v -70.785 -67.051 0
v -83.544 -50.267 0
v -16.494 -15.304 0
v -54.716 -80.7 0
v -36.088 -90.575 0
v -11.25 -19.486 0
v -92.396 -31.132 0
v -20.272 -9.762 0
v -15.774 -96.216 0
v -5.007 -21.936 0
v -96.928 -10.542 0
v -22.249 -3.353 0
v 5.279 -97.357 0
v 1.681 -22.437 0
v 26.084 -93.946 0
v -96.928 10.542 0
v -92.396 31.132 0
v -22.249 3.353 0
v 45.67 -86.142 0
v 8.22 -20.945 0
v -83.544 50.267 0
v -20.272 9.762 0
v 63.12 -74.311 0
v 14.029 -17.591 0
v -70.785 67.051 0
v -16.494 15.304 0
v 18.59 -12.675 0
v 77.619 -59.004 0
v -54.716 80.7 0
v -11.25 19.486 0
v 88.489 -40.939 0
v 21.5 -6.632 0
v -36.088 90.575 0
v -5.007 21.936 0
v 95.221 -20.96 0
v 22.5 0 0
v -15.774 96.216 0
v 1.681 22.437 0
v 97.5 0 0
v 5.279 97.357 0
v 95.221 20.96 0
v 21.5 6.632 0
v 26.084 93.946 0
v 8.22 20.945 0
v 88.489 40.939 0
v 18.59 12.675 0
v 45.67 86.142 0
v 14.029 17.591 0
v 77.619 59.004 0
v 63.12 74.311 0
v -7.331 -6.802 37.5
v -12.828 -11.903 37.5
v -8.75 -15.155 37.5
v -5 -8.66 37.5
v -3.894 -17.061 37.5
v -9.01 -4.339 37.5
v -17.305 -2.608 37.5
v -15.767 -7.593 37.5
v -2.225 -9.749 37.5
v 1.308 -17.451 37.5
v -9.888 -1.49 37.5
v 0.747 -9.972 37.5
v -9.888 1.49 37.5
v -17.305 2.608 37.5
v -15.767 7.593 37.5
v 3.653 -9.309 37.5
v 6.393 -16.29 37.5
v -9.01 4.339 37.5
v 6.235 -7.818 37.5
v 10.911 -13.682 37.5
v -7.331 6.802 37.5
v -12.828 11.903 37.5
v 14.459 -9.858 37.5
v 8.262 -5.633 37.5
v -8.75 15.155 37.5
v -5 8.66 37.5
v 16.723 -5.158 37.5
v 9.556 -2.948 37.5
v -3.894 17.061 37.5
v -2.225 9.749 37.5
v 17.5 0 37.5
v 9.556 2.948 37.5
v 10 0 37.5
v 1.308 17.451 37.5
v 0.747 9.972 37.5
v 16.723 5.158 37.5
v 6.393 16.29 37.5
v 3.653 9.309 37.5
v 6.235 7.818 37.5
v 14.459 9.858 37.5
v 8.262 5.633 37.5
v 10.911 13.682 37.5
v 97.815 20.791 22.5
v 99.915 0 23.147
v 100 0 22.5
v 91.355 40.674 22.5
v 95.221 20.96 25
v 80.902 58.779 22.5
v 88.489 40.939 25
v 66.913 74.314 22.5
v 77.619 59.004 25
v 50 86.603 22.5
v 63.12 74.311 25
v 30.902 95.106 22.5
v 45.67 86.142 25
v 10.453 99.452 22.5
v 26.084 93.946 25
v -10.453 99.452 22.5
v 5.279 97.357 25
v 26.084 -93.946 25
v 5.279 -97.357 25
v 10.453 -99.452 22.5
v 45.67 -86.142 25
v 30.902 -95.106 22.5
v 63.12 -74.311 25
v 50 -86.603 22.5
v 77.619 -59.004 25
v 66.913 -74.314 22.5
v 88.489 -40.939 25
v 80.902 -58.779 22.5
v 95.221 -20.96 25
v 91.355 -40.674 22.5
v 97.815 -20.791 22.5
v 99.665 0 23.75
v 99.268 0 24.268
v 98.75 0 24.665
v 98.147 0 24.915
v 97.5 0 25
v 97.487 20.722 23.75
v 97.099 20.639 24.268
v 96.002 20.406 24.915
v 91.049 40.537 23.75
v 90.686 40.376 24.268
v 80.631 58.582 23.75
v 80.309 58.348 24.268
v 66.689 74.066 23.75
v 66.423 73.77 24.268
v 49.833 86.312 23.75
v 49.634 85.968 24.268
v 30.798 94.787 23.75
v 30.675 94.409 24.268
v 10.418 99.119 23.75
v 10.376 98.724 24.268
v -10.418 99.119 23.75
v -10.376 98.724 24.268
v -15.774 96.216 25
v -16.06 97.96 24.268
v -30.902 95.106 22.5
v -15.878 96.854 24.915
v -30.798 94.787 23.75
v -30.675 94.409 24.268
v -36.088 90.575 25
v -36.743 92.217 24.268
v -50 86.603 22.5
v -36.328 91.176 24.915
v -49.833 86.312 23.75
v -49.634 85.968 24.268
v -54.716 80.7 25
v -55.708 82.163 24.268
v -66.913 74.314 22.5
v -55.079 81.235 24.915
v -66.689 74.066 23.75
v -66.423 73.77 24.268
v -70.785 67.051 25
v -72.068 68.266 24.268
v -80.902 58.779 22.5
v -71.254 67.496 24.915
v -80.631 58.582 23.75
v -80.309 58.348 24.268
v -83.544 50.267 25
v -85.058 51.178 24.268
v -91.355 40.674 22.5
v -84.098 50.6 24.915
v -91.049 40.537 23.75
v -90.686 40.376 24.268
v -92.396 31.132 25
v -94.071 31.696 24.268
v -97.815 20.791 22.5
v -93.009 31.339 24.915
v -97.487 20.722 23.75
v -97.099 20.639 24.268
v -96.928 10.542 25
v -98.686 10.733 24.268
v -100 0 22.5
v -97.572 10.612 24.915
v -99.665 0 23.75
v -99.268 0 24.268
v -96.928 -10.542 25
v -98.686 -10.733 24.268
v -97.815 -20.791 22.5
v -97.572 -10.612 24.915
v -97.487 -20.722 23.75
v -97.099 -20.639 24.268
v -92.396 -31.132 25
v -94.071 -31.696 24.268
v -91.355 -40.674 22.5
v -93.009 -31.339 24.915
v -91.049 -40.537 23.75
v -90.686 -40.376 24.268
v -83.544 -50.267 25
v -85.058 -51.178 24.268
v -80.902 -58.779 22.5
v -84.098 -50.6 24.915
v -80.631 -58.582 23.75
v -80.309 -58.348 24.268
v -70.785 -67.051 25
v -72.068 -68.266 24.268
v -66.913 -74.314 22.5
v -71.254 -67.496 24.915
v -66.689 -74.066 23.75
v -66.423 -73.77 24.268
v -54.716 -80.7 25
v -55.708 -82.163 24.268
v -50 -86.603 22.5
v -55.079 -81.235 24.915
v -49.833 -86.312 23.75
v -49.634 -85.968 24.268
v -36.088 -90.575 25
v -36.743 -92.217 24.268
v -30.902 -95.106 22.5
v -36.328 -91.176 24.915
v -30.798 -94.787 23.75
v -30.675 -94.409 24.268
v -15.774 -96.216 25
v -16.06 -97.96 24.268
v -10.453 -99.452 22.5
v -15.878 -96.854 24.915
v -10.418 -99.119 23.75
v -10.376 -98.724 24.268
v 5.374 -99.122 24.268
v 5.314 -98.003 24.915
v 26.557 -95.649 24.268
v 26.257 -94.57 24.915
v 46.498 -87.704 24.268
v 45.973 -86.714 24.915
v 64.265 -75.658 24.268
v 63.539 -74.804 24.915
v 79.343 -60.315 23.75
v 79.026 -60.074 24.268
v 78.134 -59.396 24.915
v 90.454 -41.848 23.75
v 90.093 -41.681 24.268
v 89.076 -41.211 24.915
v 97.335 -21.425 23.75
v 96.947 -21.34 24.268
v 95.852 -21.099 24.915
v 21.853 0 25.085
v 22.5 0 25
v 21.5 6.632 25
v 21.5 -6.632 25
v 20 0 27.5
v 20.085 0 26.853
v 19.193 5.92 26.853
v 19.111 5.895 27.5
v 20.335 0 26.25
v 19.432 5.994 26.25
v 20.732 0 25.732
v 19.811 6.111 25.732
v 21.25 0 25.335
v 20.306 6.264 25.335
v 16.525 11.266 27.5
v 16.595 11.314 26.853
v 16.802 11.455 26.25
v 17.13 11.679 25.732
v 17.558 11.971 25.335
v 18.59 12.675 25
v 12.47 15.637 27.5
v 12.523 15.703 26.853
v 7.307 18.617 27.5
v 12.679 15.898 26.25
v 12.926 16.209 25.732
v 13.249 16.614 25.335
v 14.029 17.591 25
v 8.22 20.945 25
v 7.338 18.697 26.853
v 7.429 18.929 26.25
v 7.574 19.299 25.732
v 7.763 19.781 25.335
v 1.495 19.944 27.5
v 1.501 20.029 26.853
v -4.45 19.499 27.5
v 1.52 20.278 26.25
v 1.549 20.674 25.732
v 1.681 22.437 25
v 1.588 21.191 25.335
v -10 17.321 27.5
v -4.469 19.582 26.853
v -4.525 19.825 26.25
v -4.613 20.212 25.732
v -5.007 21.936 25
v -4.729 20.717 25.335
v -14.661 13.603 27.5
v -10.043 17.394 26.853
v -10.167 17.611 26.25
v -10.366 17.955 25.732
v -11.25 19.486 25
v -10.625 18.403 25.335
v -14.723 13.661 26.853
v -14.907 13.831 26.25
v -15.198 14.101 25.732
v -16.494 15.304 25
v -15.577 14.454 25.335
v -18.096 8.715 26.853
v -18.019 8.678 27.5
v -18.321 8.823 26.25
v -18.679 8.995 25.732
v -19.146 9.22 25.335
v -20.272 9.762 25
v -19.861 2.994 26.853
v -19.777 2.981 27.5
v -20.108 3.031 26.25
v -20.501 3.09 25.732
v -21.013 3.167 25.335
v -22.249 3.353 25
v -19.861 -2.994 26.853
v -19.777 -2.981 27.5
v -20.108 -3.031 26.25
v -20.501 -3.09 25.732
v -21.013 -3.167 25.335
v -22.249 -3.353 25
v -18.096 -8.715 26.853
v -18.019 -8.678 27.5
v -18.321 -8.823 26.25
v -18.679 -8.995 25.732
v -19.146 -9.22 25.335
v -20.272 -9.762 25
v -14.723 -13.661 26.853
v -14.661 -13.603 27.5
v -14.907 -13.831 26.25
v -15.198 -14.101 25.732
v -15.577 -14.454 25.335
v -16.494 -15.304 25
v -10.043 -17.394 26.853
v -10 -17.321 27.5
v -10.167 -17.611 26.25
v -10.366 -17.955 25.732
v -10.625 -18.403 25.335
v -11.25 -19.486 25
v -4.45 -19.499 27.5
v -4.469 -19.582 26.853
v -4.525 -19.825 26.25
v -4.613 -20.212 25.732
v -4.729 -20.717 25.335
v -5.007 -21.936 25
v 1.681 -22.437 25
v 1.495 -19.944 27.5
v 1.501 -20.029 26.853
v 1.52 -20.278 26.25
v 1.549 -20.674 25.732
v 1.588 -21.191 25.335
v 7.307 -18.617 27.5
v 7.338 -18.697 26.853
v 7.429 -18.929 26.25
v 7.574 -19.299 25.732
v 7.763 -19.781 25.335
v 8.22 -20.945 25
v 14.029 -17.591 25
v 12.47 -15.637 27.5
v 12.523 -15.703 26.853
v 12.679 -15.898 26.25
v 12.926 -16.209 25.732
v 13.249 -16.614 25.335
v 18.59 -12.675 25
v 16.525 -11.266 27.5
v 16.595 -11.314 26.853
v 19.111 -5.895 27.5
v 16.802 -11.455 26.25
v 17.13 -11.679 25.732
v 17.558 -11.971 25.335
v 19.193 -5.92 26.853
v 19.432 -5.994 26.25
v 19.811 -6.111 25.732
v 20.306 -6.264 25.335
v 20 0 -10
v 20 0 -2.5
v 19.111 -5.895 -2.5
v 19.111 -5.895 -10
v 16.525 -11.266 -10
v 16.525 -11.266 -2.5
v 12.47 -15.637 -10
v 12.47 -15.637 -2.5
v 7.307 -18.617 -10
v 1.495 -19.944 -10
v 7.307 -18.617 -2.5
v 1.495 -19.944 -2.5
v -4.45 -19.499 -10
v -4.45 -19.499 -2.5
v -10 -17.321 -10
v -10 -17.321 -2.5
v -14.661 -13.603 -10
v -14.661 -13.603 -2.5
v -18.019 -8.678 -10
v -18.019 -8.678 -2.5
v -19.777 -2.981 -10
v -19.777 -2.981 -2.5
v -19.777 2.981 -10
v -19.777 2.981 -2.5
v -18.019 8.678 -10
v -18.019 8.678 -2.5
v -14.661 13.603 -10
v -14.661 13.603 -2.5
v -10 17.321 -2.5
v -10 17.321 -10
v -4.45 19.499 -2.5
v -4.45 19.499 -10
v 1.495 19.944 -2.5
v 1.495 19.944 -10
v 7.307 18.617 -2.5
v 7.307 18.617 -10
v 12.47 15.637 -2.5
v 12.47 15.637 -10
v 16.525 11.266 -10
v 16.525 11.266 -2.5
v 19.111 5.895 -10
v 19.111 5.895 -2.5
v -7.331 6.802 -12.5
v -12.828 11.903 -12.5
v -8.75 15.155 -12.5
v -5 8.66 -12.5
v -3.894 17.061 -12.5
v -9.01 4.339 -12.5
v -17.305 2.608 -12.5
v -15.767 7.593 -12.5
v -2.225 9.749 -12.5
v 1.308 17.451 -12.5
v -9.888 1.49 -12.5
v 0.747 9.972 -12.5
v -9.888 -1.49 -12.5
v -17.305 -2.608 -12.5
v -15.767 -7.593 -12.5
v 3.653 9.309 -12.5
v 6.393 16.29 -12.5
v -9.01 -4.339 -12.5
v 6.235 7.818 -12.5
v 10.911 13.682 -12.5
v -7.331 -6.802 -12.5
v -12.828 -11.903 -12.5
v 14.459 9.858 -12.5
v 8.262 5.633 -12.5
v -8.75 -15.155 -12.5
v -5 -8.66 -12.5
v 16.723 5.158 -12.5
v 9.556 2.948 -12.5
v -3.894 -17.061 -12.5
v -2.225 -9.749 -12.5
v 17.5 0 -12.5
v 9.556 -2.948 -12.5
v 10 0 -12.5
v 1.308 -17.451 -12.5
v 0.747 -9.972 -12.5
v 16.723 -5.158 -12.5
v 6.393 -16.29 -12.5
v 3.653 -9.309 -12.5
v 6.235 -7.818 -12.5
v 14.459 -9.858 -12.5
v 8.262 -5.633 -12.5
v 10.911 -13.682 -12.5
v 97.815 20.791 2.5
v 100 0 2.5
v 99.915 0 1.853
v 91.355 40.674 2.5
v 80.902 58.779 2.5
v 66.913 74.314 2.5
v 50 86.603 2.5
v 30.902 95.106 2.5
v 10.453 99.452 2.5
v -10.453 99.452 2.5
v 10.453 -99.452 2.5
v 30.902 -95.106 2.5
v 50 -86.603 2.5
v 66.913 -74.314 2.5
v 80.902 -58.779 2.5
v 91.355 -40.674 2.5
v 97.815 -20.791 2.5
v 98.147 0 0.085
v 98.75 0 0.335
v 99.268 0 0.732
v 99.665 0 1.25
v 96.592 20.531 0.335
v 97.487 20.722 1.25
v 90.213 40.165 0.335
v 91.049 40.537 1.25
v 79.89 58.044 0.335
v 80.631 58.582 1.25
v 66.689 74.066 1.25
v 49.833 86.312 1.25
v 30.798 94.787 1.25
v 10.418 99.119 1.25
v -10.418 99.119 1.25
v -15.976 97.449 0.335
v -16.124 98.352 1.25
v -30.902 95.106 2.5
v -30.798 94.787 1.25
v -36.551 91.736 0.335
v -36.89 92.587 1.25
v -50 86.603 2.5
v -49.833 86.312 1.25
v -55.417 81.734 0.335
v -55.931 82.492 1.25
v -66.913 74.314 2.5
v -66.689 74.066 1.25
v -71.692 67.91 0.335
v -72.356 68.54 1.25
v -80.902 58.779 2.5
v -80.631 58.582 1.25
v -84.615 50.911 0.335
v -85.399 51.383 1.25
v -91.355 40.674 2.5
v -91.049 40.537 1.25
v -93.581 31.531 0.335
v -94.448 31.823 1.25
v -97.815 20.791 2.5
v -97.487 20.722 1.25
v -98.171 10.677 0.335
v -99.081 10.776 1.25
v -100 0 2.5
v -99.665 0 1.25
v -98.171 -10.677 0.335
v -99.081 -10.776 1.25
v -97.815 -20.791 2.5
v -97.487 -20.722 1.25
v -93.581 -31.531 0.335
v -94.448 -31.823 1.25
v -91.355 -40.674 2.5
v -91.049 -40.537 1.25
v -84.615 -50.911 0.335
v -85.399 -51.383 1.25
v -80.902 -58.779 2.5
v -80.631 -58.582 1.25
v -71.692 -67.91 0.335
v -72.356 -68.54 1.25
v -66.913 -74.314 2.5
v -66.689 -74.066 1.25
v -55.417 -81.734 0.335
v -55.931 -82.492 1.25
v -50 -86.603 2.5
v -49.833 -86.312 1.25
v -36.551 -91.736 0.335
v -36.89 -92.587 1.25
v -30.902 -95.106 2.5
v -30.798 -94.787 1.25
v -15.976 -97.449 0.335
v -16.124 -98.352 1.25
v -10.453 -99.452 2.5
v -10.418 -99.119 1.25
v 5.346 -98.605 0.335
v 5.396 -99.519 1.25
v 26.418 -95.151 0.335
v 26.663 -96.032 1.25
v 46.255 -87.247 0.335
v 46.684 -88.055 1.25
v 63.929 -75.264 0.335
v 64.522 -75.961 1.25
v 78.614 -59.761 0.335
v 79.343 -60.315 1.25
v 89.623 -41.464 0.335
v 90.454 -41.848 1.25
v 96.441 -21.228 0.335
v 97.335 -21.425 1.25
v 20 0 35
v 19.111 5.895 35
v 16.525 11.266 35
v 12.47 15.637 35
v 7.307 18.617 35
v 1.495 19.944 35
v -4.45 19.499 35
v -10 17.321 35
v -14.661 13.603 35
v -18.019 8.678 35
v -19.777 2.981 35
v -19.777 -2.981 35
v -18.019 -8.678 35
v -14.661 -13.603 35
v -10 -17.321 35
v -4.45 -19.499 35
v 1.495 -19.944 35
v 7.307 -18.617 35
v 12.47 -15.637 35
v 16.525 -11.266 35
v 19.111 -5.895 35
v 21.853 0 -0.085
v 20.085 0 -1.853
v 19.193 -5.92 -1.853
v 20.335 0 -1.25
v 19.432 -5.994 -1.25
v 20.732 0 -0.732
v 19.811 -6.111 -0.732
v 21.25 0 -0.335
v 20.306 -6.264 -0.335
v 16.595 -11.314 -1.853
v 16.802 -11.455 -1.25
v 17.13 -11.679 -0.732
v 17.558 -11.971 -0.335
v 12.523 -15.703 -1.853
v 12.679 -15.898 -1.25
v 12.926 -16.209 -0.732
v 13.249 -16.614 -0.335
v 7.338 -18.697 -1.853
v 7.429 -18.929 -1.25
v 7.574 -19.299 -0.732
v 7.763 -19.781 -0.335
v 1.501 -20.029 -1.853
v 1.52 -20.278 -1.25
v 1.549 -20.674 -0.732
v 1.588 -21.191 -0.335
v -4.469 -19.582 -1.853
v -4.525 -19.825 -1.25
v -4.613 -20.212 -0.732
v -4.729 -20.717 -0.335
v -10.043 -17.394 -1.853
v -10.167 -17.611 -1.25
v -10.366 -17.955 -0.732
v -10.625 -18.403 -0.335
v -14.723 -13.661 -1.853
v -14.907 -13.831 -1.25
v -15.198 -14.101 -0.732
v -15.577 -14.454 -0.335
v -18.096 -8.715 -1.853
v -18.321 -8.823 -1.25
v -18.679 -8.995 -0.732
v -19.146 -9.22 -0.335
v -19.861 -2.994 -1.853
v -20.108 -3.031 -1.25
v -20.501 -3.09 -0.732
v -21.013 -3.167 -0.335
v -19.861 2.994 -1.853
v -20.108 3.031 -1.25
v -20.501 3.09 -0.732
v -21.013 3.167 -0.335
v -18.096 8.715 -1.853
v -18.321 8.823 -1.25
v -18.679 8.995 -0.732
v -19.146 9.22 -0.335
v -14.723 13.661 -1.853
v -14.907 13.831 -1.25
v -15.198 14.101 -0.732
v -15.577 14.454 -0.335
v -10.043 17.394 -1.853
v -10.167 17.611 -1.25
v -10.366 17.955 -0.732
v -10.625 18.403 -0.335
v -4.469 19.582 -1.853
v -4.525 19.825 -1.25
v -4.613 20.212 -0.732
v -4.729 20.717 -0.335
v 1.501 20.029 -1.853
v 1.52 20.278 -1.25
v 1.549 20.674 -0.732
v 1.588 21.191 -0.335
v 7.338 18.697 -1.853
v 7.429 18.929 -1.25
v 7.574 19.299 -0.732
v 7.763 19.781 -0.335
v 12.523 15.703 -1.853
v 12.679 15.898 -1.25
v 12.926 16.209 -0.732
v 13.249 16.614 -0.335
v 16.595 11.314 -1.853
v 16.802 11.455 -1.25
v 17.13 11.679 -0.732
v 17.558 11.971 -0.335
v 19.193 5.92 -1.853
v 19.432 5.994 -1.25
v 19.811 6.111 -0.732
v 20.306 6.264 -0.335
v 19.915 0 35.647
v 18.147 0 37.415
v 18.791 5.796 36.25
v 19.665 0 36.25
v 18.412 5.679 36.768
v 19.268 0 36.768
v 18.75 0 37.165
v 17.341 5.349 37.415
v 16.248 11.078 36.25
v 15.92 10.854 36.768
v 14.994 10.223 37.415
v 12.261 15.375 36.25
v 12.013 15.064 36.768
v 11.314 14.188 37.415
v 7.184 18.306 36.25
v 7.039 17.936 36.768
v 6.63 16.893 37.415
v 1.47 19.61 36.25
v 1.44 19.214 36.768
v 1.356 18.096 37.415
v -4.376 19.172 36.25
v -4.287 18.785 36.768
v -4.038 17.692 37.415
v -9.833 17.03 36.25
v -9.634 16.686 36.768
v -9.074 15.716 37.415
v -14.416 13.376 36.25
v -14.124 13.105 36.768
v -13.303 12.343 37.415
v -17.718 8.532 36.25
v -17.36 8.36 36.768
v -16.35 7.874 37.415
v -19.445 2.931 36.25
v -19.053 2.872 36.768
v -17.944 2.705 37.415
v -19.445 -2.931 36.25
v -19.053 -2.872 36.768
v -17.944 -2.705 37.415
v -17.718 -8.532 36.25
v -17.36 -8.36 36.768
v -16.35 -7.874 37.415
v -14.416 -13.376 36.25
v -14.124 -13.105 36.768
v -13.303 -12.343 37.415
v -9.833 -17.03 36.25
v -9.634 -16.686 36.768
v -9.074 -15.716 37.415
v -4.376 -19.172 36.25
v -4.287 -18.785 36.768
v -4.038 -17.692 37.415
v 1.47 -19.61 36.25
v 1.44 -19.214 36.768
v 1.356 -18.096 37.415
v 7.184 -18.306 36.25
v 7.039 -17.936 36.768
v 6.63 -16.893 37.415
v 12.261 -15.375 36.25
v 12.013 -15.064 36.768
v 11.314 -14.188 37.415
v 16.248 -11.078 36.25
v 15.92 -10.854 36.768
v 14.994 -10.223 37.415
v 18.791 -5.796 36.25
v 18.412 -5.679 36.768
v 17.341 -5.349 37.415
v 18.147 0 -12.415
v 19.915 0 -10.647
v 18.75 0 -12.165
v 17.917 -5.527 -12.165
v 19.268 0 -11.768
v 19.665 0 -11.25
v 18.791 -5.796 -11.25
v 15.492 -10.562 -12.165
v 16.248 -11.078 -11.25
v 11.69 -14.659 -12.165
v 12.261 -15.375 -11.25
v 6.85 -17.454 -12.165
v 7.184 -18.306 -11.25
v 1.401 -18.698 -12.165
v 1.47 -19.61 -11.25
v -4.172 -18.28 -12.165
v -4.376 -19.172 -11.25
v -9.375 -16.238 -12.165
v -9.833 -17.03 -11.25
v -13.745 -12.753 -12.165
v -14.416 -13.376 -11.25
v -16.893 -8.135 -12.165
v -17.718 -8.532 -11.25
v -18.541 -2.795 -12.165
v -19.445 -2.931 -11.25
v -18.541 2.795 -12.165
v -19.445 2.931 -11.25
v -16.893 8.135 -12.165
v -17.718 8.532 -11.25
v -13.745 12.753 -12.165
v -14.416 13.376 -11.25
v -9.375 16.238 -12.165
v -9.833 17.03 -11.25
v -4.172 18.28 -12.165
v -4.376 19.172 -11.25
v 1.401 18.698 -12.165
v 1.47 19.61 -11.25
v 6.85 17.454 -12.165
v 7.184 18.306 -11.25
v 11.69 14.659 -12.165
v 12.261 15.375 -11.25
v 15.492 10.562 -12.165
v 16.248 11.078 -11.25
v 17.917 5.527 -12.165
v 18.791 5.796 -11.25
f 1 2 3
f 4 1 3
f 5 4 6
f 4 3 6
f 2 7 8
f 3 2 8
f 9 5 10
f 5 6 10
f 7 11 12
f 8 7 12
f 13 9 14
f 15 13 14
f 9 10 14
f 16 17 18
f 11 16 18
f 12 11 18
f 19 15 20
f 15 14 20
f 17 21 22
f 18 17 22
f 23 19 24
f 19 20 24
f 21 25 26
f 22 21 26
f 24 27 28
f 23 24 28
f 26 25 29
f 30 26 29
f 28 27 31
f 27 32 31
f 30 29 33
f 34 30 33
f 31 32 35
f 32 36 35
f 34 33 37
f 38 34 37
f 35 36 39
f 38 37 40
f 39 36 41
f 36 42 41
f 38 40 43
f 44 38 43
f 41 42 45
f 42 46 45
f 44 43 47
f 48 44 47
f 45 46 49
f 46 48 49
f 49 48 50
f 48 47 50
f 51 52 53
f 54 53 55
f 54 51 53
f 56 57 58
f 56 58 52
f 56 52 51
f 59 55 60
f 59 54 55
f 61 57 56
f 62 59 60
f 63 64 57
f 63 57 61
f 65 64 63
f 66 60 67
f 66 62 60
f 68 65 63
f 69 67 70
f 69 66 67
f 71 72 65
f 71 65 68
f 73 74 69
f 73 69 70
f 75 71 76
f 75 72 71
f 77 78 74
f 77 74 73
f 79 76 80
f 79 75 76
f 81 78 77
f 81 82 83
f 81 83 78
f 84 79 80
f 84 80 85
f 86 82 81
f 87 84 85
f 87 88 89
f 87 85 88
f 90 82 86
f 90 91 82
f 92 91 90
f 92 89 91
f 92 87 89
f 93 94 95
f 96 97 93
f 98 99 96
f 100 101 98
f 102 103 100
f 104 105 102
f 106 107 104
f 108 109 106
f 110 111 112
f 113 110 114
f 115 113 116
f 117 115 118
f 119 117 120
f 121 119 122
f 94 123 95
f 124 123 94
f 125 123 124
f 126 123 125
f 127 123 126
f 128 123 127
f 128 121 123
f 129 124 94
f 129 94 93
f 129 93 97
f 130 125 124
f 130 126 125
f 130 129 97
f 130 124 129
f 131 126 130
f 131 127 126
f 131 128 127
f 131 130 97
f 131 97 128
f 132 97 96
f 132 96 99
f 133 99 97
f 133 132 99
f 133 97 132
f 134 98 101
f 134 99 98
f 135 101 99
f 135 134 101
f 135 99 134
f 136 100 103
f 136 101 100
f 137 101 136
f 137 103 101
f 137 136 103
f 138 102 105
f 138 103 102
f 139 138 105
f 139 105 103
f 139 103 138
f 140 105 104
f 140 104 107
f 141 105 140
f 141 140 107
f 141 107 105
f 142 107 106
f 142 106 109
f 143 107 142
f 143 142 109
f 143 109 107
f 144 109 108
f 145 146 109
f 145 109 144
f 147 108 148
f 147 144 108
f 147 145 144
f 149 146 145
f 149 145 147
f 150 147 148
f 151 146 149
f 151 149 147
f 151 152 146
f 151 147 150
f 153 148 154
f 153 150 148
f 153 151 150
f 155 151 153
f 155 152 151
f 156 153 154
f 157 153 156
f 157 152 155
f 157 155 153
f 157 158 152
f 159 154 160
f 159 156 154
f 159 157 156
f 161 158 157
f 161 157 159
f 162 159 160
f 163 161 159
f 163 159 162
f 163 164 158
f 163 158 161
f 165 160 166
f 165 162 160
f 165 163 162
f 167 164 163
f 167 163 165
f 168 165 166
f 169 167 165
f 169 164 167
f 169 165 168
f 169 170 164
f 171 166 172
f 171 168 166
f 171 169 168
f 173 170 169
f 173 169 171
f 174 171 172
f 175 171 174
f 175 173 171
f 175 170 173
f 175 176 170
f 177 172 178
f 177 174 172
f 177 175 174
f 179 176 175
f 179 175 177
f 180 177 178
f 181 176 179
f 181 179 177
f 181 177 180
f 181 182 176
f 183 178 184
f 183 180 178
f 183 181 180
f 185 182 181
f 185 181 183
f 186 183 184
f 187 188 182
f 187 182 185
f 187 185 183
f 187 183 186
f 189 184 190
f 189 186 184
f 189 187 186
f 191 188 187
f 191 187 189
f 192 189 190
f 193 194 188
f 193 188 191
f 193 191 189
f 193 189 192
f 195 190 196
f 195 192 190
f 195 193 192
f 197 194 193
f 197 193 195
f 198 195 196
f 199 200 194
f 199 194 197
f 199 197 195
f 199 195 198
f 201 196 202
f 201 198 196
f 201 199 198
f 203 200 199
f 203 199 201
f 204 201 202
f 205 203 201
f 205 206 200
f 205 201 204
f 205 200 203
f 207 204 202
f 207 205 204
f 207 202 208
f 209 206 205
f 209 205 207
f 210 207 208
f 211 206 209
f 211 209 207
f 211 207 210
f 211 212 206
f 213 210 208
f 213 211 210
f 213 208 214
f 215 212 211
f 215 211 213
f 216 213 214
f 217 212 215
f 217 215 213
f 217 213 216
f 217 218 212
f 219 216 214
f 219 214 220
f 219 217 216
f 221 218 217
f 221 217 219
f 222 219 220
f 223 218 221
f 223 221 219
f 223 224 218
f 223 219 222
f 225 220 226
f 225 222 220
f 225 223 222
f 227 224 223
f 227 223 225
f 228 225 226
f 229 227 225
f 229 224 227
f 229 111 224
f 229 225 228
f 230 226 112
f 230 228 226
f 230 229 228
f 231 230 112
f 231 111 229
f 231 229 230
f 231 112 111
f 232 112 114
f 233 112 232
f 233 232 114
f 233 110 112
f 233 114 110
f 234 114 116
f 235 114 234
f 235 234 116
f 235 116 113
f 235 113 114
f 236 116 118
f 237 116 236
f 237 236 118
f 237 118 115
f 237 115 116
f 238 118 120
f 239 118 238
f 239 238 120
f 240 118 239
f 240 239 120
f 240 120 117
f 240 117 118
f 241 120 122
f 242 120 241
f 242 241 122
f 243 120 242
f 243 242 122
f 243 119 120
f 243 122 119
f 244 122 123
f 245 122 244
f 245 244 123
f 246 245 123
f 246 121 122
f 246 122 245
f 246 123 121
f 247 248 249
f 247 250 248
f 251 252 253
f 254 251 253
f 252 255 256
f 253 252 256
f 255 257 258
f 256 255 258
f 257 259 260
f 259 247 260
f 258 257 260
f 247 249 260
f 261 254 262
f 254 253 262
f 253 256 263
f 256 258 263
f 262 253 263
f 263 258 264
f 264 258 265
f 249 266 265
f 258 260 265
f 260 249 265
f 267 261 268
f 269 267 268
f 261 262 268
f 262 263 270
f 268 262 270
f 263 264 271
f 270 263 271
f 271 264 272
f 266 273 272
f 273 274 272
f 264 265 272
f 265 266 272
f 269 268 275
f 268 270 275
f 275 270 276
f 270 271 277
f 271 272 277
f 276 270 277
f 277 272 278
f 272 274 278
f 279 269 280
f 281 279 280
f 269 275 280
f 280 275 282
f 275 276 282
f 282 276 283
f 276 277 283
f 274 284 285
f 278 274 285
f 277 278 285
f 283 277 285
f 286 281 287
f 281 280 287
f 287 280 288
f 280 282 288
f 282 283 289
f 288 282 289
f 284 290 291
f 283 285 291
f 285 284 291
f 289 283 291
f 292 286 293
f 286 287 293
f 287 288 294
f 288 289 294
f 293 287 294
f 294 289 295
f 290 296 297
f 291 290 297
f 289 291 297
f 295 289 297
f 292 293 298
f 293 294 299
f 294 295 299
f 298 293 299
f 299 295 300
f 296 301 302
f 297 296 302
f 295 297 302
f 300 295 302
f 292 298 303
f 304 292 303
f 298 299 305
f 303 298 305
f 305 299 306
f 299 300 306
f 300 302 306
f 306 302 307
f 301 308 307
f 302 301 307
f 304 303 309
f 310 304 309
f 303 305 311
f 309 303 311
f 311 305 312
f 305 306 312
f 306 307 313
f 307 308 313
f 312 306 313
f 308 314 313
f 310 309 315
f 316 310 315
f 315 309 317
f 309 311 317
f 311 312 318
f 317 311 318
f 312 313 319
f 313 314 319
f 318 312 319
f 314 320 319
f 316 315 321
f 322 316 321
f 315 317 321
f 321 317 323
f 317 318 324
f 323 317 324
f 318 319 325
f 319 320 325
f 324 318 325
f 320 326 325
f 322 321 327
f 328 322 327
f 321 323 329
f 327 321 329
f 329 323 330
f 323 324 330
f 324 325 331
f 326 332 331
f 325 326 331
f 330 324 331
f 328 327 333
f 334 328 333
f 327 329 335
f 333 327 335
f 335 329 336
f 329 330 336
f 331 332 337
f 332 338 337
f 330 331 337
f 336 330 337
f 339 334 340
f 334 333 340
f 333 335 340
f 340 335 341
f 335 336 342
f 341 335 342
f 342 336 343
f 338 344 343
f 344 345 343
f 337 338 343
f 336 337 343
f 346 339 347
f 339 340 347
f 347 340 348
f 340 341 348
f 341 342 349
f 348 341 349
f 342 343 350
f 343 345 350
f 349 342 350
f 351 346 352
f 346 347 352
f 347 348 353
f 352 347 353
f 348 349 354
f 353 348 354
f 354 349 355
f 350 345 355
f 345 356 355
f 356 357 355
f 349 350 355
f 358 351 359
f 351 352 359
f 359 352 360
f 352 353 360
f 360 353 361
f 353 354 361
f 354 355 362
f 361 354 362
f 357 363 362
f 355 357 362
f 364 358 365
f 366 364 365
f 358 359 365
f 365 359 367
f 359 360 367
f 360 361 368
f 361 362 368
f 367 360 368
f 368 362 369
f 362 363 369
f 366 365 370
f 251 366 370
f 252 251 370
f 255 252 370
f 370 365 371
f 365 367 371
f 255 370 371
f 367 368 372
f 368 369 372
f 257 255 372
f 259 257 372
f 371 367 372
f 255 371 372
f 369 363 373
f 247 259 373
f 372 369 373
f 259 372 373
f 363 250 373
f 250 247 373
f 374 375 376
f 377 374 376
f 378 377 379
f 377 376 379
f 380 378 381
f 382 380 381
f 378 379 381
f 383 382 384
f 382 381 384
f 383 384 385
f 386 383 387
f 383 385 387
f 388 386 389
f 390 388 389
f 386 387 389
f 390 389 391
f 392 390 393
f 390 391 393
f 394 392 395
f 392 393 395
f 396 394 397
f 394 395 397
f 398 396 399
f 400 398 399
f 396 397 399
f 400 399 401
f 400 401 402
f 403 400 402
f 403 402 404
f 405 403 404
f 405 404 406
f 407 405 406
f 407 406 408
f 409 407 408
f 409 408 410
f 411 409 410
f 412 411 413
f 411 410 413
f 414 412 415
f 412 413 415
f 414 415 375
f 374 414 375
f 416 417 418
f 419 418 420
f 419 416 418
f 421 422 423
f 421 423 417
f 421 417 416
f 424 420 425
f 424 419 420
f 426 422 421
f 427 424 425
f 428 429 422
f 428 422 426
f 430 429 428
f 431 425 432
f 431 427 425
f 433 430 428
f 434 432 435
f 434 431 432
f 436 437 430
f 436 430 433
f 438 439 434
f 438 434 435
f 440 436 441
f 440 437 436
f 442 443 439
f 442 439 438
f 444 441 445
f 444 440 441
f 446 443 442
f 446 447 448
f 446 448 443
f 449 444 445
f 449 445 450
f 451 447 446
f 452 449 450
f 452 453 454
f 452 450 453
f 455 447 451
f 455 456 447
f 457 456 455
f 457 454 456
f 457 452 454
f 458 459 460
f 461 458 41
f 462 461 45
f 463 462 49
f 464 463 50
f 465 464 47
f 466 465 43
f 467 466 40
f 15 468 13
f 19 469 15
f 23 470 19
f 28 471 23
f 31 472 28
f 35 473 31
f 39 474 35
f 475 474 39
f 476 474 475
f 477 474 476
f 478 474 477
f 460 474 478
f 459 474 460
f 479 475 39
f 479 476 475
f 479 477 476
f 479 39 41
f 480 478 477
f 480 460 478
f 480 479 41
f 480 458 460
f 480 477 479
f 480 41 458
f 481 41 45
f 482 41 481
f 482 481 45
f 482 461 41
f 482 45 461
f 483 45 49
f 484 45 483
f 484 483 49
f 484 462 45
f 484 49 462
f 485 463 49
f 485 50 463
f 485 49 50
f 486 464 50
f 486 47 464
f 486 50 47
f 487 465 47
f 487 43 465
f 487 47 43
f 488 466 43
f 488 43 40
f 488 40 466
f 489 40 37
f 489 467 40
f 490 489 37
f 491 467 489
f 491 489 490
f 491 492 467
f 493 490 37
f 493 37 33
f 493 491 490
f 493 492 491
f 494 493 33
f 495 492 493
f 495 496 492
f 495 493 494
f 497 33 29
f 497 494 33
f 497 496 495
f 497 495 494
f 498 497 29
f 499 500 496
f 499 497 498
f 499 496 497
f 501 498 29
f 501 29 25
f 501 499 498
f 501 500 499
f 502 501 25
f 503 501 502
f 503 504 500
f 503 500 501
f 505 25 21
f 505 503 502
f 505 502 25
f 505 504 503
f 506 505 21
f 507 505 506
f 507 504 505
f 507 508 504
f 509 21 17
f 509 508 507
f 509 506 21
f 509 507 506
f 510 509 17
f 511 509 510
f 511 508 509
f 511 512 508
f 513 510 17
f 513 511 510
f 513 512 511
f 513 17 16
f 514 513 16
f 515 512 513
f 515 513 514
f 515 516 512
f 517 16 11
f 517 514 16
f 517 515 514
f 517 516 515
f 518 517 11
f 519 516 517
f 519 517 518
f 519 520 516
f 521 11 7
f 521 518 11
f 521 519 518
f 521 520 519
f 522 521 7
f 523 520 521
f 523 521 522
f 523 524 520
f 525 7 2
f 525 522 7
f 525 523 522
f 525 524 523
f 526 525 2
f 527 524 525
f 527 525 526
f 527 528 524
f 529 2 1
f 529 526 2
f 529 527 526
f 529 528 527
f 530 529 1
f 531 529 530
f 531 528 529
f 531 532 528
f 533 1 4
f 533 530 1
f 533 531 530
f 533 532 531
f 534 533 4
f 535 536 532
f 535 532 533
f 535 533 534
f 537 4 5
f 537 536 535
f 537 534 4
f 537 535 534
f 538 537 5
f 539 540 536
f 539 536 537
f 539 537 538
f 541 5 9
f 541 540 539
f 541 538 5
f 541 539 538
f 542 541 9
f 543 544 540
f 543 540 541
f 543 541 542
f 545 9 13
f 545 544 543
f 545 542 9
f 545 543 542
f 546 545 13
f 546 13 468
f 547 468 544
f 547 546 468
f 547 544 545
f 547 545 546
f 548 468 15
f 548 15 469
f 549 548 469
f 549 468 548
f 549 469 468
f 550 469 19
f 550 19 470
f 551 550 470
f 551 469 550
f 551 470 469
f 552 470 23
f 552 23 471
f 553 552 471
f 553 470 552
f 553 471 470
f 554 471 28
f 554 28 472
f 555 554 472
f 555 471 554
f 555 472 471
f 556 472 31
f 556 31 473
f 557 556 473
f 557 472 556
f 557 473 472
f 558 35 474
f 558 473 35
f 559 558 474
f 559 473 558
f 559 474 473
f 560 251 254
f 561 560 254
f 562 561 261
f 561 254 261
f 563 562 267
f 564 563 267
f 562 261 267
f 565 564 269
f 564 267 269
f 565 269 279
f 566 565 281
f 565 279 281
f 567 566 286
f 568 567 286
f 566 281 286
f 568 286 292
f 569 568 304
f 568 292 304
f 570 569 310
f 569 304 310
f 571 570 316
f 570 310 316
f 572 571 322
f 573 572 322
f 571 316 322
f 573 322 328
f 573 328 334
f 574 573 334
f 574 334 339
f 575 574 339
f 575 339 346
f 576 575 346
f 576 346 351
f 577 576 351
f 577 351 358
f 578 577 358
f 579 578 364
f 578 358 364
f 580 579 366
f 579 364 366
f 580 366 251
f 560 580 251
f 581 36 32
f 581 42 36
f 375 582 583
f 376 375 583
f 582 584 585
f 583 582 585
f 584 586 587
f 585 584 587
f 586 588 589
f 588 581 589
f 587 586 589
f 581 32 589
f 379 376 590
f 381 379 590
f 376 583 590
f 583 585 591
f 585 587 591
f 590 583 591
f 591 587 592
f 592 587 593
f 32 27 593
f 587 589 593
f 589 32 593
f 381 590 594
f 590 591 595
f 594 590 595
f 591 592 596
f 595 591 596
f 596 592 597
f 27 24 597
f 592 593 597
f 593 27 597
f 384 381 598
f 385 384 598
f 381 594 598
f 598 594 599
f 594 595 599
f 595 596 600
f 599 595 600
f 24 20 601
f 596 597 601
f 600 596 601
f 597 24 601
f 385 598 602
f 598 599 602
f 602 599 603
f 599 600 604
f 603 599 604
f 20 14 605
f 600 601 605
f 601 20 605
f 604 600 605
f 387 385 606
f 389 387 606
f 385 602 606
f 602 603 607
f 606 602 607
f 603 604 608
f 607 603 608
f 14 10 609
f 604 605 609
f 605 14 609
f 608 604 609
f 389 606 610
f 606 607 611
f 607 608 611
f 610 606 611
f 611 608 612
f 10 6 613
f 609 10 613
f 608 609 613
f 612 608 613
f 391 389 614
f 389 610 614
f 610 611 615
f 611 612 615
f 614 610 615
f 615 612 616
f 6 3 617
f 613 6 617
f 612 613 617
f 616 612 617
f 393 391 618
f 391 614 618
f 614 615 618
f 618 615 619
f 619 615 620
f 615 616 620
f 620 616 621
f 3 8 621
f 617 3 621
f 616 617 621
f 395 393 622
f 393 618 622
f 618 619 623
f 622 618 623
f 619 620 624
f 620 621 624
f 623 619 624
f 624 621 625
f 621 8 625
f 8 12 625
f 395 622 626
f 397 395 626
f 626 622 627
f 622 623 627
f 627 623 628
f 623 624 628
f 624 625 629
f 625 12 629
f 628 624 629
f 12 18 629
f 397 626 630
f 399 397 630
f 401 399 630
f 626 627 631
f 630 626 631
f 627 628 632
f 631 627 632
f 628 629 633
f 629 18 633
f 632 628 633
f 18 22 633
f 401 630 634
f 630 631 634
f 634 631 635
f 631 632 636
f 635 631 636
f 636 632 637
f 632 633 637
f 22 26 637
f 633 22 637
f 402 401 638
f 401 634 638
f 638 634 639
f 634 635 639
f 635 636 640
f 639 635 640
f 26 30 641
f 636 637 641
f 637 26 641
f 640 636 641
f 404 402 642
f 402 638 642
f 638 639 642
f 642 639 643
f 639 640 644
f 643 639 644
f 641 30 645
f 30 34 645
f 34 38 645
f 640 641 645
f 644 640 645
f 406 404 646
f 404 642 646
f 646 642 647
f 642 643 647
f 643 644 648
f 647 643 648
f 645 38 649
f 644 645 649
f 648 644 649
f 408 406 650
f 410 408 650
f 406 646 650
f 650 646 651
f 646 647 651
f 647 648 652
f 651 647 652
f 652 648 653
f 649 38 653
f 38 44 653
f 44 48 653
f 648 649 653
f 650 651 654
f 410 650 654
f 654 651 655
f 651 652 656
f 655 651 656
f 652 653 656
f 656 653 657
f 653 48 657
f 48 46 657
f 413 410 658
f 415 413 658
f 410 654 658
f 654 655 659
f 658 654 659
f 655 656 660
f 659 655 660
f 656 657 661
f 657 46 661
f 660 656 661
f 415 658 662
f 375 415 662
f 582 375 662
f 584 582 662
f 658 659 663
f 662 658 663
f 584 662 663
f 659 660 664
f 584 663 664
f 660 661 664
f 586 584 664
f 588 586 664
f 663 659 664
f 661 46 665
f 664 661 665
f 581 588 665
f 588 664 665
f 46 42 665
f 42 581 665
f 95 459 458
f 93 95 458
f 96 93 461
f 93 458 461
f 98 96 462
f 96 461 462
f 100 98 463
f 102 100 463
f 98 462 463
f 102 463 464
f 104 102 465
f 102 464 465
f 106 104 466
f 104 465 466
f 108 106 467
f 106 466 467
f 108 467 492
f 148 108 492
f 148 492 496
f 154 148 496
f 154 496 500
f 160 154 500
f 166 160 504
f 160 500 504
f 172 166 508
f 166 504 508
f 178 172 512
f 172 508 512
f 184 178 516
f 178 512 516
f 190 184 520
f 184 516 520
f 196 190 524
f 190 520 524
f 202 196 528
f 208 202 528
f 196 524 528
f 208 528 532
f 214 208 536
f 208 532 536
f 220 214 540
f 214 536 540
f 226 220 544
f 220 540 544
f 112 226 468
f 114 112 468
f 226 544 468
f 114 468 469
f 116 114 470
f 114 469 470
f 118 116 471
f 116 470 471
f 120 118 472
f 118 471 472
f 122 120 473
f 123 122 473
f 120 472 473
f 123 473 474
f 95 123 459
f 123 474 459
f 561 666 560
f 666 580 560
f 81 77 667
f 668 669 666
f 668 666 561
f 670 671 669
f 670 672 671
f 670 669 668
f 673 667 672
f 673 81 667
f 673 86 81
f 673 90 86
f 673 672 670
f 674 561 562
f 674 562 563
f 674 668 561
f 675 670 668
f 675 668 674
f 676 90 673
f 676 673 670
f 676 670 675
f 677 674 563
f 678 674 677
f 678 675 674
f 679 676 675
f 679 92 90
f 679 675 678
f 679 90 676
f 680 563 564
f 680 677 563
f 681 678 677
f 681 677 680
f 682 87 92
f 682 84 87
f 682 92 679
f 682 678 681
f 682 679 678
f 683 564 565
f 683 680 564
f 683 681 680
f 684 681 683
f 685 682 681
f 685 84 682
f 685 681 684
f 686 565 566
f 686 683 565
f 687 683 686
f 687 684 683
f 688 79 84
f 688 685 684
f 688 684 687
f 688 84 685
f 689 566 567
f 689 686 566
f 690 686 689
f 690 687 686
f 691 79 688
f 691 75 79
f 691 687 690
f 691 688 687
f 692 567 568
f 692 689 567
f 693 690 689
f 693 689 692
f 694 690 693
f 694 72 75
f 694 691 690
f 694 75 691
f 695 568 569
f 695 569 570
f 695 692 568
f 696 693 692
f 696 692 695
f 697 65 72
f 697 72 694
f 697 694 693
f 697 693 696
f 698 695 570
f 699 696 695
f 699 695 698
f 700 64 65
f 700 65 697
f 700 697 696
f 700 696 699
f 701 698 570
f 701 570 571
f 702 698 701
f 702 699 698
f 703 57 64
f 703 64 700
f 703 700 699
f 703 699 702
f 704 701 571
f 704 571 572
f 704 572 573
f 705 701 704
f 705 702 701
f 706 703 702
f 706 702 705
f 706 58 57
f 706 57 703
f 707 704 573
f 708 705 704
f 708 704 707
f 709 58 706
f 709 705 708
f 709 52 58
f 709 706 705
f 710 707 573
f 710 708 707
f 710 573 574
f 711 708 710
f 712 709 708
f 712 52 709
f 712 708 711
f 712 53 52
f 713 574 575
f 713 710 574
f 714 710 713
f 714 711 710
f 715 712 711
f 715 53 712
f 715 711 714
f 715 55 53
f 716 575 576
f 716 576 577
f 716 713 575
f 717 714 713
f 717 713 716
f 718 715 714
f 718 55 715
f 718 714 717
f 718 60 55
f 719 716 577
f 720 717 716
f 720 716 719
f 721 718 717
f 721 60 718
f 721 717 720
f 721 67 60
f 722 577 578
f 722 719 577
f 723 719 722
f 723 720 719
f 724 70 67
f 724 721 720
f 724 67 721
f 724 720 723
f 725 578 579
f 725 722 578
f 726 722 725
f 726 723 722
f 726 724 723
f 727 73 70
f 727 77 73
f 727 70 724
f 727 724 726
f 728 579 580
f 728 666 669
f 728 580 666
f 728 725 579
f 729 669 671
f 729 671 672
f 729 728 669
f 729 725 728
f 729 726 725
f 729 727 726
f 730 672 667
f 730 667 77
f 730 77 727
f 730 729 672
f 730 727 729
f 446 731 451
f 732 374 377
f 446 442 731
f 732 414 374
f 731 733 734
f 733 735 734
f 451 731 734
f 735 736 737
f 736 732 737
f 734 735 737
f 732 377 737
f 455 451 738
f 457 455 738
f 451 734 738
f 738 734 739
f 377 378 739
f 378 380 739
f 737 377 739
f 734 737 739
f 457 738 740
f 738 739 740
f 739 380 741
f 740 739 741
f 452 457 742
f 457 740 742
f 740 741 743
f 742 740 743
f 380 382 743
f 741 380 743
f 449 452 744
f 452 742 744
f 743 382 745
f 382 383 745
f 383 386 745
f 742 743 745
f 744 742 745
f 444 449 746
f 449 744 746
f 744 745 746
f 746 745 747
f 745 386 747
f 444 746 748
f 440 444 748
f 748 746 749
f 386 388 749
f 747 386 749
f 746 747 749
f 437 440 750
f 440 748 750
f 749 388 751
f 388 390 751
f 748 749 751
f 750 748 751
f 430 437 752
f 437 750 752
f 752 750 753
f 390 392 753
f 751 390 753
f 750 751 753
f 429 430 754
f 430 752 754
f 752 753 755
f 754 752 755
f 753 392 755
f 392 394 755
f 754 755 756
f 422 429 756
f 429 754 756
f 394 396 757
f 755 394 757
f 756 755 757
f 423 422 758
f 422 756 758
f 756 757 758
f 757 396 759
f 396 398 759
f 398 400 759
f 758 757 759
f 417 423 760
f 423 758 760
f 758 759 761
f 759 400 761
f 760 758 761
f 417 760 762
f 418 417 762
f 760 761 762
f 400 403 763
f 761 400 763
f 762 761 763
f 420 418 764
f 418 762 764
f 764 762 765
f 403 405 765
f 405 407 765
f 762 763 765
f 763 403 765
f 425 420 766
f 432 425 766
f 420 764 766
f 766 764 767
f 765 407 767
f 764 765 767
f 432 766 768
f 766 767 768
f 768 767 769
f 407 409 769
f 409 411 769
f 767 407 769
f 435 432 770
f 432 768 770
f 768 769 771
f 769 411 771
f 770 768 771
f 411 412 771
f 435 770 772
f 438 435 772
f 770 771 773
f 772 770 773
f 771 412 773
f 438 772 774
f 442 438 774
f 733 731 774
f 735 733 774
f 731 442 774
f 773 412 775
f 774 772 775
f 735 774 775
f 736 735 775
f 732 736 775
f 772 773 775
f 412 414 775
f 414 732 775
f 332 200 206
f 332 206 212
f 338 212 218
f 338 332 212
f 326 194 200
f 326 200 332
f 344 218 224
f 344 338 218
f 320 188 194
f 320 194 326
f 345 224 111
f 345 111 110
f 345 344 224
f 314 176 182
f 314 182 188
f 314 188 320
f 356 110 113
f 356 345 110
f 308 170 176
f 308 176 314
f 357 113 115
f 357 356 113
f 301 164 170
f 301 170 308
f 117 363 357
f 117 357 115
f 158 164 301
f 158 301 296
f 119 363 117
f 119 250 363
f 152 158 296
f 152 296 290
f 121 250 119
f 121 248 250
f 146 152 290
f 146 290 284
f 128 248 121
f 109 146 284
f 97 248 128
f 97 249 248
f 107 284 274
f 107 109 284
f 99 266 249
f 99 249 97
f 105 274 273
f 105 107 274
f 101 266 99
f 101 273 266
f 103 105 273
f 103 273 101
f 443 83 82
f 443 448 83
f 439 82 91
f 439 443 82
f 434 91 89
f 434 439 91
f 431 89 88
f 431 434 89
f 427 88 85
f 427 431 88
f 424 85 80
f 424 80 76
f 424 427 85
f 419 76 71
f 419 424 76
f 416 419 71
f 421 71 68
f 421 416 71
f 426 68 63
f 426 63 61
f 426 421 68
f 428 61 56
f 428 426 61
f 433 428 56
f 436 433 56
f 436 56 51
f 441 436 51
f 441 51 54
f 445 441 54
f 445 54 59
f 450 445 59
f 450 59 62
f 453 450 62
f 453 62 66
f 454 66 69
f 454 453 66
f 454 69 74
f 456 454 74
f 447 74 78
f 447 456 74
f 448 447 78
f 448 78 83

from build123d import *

# Parameters (mm, degrees)
F0_R     = 100
F0_R_2   = 10
F1_DEPTH = 25
F2_R     = 20
F2_R_2   = 10
F3_DEPTH = 12.5
F4_R     = 20
F4_R_2   = 10
F5_DEPTH = 12.5
F6_R     = 2.5


with BuildPart() as f1:
    # F0 (on Top) → F1 (new body)
    with BuildSketch(Plane.XY):
        Circle(F0_R)
        Circle(F0_R_2, mode=Mode.SUBTRACT)
    extrude(amount=F1_DEPTH)

    # F2 (on face) → F3 (join)
    with BuildSketch(Plane(origin=(0, 0, 0), x_dir=(1, 0, 0), z_dir=(0, 0, -1))):
        Circle(F2_R)
        Circle(F2_R_2, mode=Mode.SUBTRACT)
    extrude(amount=F3_DEPTH)

    # F4 (on face) → F5 (join)
    with BuildSketch(Plane.XY.offset(25)):
        Circle(F4_R)
        Circle(F4_R_2, mode=Mode.SUBTRACT)
    extrude(amount=F5_DEPTH)

    # F6
    f6_edges = [f1.edges().sort_by_distance(p)[0] for p in [
        (-100, 0, 0),
        (-20, 0, 0),
        (-100, 0, 25),
        (-20, 0, 25),
        (-20, 0, 37.5),
        (-20, 0, -12.5),
    ]]
    fillet(f6_edges, radius=F6_R)


solid = f1.part
